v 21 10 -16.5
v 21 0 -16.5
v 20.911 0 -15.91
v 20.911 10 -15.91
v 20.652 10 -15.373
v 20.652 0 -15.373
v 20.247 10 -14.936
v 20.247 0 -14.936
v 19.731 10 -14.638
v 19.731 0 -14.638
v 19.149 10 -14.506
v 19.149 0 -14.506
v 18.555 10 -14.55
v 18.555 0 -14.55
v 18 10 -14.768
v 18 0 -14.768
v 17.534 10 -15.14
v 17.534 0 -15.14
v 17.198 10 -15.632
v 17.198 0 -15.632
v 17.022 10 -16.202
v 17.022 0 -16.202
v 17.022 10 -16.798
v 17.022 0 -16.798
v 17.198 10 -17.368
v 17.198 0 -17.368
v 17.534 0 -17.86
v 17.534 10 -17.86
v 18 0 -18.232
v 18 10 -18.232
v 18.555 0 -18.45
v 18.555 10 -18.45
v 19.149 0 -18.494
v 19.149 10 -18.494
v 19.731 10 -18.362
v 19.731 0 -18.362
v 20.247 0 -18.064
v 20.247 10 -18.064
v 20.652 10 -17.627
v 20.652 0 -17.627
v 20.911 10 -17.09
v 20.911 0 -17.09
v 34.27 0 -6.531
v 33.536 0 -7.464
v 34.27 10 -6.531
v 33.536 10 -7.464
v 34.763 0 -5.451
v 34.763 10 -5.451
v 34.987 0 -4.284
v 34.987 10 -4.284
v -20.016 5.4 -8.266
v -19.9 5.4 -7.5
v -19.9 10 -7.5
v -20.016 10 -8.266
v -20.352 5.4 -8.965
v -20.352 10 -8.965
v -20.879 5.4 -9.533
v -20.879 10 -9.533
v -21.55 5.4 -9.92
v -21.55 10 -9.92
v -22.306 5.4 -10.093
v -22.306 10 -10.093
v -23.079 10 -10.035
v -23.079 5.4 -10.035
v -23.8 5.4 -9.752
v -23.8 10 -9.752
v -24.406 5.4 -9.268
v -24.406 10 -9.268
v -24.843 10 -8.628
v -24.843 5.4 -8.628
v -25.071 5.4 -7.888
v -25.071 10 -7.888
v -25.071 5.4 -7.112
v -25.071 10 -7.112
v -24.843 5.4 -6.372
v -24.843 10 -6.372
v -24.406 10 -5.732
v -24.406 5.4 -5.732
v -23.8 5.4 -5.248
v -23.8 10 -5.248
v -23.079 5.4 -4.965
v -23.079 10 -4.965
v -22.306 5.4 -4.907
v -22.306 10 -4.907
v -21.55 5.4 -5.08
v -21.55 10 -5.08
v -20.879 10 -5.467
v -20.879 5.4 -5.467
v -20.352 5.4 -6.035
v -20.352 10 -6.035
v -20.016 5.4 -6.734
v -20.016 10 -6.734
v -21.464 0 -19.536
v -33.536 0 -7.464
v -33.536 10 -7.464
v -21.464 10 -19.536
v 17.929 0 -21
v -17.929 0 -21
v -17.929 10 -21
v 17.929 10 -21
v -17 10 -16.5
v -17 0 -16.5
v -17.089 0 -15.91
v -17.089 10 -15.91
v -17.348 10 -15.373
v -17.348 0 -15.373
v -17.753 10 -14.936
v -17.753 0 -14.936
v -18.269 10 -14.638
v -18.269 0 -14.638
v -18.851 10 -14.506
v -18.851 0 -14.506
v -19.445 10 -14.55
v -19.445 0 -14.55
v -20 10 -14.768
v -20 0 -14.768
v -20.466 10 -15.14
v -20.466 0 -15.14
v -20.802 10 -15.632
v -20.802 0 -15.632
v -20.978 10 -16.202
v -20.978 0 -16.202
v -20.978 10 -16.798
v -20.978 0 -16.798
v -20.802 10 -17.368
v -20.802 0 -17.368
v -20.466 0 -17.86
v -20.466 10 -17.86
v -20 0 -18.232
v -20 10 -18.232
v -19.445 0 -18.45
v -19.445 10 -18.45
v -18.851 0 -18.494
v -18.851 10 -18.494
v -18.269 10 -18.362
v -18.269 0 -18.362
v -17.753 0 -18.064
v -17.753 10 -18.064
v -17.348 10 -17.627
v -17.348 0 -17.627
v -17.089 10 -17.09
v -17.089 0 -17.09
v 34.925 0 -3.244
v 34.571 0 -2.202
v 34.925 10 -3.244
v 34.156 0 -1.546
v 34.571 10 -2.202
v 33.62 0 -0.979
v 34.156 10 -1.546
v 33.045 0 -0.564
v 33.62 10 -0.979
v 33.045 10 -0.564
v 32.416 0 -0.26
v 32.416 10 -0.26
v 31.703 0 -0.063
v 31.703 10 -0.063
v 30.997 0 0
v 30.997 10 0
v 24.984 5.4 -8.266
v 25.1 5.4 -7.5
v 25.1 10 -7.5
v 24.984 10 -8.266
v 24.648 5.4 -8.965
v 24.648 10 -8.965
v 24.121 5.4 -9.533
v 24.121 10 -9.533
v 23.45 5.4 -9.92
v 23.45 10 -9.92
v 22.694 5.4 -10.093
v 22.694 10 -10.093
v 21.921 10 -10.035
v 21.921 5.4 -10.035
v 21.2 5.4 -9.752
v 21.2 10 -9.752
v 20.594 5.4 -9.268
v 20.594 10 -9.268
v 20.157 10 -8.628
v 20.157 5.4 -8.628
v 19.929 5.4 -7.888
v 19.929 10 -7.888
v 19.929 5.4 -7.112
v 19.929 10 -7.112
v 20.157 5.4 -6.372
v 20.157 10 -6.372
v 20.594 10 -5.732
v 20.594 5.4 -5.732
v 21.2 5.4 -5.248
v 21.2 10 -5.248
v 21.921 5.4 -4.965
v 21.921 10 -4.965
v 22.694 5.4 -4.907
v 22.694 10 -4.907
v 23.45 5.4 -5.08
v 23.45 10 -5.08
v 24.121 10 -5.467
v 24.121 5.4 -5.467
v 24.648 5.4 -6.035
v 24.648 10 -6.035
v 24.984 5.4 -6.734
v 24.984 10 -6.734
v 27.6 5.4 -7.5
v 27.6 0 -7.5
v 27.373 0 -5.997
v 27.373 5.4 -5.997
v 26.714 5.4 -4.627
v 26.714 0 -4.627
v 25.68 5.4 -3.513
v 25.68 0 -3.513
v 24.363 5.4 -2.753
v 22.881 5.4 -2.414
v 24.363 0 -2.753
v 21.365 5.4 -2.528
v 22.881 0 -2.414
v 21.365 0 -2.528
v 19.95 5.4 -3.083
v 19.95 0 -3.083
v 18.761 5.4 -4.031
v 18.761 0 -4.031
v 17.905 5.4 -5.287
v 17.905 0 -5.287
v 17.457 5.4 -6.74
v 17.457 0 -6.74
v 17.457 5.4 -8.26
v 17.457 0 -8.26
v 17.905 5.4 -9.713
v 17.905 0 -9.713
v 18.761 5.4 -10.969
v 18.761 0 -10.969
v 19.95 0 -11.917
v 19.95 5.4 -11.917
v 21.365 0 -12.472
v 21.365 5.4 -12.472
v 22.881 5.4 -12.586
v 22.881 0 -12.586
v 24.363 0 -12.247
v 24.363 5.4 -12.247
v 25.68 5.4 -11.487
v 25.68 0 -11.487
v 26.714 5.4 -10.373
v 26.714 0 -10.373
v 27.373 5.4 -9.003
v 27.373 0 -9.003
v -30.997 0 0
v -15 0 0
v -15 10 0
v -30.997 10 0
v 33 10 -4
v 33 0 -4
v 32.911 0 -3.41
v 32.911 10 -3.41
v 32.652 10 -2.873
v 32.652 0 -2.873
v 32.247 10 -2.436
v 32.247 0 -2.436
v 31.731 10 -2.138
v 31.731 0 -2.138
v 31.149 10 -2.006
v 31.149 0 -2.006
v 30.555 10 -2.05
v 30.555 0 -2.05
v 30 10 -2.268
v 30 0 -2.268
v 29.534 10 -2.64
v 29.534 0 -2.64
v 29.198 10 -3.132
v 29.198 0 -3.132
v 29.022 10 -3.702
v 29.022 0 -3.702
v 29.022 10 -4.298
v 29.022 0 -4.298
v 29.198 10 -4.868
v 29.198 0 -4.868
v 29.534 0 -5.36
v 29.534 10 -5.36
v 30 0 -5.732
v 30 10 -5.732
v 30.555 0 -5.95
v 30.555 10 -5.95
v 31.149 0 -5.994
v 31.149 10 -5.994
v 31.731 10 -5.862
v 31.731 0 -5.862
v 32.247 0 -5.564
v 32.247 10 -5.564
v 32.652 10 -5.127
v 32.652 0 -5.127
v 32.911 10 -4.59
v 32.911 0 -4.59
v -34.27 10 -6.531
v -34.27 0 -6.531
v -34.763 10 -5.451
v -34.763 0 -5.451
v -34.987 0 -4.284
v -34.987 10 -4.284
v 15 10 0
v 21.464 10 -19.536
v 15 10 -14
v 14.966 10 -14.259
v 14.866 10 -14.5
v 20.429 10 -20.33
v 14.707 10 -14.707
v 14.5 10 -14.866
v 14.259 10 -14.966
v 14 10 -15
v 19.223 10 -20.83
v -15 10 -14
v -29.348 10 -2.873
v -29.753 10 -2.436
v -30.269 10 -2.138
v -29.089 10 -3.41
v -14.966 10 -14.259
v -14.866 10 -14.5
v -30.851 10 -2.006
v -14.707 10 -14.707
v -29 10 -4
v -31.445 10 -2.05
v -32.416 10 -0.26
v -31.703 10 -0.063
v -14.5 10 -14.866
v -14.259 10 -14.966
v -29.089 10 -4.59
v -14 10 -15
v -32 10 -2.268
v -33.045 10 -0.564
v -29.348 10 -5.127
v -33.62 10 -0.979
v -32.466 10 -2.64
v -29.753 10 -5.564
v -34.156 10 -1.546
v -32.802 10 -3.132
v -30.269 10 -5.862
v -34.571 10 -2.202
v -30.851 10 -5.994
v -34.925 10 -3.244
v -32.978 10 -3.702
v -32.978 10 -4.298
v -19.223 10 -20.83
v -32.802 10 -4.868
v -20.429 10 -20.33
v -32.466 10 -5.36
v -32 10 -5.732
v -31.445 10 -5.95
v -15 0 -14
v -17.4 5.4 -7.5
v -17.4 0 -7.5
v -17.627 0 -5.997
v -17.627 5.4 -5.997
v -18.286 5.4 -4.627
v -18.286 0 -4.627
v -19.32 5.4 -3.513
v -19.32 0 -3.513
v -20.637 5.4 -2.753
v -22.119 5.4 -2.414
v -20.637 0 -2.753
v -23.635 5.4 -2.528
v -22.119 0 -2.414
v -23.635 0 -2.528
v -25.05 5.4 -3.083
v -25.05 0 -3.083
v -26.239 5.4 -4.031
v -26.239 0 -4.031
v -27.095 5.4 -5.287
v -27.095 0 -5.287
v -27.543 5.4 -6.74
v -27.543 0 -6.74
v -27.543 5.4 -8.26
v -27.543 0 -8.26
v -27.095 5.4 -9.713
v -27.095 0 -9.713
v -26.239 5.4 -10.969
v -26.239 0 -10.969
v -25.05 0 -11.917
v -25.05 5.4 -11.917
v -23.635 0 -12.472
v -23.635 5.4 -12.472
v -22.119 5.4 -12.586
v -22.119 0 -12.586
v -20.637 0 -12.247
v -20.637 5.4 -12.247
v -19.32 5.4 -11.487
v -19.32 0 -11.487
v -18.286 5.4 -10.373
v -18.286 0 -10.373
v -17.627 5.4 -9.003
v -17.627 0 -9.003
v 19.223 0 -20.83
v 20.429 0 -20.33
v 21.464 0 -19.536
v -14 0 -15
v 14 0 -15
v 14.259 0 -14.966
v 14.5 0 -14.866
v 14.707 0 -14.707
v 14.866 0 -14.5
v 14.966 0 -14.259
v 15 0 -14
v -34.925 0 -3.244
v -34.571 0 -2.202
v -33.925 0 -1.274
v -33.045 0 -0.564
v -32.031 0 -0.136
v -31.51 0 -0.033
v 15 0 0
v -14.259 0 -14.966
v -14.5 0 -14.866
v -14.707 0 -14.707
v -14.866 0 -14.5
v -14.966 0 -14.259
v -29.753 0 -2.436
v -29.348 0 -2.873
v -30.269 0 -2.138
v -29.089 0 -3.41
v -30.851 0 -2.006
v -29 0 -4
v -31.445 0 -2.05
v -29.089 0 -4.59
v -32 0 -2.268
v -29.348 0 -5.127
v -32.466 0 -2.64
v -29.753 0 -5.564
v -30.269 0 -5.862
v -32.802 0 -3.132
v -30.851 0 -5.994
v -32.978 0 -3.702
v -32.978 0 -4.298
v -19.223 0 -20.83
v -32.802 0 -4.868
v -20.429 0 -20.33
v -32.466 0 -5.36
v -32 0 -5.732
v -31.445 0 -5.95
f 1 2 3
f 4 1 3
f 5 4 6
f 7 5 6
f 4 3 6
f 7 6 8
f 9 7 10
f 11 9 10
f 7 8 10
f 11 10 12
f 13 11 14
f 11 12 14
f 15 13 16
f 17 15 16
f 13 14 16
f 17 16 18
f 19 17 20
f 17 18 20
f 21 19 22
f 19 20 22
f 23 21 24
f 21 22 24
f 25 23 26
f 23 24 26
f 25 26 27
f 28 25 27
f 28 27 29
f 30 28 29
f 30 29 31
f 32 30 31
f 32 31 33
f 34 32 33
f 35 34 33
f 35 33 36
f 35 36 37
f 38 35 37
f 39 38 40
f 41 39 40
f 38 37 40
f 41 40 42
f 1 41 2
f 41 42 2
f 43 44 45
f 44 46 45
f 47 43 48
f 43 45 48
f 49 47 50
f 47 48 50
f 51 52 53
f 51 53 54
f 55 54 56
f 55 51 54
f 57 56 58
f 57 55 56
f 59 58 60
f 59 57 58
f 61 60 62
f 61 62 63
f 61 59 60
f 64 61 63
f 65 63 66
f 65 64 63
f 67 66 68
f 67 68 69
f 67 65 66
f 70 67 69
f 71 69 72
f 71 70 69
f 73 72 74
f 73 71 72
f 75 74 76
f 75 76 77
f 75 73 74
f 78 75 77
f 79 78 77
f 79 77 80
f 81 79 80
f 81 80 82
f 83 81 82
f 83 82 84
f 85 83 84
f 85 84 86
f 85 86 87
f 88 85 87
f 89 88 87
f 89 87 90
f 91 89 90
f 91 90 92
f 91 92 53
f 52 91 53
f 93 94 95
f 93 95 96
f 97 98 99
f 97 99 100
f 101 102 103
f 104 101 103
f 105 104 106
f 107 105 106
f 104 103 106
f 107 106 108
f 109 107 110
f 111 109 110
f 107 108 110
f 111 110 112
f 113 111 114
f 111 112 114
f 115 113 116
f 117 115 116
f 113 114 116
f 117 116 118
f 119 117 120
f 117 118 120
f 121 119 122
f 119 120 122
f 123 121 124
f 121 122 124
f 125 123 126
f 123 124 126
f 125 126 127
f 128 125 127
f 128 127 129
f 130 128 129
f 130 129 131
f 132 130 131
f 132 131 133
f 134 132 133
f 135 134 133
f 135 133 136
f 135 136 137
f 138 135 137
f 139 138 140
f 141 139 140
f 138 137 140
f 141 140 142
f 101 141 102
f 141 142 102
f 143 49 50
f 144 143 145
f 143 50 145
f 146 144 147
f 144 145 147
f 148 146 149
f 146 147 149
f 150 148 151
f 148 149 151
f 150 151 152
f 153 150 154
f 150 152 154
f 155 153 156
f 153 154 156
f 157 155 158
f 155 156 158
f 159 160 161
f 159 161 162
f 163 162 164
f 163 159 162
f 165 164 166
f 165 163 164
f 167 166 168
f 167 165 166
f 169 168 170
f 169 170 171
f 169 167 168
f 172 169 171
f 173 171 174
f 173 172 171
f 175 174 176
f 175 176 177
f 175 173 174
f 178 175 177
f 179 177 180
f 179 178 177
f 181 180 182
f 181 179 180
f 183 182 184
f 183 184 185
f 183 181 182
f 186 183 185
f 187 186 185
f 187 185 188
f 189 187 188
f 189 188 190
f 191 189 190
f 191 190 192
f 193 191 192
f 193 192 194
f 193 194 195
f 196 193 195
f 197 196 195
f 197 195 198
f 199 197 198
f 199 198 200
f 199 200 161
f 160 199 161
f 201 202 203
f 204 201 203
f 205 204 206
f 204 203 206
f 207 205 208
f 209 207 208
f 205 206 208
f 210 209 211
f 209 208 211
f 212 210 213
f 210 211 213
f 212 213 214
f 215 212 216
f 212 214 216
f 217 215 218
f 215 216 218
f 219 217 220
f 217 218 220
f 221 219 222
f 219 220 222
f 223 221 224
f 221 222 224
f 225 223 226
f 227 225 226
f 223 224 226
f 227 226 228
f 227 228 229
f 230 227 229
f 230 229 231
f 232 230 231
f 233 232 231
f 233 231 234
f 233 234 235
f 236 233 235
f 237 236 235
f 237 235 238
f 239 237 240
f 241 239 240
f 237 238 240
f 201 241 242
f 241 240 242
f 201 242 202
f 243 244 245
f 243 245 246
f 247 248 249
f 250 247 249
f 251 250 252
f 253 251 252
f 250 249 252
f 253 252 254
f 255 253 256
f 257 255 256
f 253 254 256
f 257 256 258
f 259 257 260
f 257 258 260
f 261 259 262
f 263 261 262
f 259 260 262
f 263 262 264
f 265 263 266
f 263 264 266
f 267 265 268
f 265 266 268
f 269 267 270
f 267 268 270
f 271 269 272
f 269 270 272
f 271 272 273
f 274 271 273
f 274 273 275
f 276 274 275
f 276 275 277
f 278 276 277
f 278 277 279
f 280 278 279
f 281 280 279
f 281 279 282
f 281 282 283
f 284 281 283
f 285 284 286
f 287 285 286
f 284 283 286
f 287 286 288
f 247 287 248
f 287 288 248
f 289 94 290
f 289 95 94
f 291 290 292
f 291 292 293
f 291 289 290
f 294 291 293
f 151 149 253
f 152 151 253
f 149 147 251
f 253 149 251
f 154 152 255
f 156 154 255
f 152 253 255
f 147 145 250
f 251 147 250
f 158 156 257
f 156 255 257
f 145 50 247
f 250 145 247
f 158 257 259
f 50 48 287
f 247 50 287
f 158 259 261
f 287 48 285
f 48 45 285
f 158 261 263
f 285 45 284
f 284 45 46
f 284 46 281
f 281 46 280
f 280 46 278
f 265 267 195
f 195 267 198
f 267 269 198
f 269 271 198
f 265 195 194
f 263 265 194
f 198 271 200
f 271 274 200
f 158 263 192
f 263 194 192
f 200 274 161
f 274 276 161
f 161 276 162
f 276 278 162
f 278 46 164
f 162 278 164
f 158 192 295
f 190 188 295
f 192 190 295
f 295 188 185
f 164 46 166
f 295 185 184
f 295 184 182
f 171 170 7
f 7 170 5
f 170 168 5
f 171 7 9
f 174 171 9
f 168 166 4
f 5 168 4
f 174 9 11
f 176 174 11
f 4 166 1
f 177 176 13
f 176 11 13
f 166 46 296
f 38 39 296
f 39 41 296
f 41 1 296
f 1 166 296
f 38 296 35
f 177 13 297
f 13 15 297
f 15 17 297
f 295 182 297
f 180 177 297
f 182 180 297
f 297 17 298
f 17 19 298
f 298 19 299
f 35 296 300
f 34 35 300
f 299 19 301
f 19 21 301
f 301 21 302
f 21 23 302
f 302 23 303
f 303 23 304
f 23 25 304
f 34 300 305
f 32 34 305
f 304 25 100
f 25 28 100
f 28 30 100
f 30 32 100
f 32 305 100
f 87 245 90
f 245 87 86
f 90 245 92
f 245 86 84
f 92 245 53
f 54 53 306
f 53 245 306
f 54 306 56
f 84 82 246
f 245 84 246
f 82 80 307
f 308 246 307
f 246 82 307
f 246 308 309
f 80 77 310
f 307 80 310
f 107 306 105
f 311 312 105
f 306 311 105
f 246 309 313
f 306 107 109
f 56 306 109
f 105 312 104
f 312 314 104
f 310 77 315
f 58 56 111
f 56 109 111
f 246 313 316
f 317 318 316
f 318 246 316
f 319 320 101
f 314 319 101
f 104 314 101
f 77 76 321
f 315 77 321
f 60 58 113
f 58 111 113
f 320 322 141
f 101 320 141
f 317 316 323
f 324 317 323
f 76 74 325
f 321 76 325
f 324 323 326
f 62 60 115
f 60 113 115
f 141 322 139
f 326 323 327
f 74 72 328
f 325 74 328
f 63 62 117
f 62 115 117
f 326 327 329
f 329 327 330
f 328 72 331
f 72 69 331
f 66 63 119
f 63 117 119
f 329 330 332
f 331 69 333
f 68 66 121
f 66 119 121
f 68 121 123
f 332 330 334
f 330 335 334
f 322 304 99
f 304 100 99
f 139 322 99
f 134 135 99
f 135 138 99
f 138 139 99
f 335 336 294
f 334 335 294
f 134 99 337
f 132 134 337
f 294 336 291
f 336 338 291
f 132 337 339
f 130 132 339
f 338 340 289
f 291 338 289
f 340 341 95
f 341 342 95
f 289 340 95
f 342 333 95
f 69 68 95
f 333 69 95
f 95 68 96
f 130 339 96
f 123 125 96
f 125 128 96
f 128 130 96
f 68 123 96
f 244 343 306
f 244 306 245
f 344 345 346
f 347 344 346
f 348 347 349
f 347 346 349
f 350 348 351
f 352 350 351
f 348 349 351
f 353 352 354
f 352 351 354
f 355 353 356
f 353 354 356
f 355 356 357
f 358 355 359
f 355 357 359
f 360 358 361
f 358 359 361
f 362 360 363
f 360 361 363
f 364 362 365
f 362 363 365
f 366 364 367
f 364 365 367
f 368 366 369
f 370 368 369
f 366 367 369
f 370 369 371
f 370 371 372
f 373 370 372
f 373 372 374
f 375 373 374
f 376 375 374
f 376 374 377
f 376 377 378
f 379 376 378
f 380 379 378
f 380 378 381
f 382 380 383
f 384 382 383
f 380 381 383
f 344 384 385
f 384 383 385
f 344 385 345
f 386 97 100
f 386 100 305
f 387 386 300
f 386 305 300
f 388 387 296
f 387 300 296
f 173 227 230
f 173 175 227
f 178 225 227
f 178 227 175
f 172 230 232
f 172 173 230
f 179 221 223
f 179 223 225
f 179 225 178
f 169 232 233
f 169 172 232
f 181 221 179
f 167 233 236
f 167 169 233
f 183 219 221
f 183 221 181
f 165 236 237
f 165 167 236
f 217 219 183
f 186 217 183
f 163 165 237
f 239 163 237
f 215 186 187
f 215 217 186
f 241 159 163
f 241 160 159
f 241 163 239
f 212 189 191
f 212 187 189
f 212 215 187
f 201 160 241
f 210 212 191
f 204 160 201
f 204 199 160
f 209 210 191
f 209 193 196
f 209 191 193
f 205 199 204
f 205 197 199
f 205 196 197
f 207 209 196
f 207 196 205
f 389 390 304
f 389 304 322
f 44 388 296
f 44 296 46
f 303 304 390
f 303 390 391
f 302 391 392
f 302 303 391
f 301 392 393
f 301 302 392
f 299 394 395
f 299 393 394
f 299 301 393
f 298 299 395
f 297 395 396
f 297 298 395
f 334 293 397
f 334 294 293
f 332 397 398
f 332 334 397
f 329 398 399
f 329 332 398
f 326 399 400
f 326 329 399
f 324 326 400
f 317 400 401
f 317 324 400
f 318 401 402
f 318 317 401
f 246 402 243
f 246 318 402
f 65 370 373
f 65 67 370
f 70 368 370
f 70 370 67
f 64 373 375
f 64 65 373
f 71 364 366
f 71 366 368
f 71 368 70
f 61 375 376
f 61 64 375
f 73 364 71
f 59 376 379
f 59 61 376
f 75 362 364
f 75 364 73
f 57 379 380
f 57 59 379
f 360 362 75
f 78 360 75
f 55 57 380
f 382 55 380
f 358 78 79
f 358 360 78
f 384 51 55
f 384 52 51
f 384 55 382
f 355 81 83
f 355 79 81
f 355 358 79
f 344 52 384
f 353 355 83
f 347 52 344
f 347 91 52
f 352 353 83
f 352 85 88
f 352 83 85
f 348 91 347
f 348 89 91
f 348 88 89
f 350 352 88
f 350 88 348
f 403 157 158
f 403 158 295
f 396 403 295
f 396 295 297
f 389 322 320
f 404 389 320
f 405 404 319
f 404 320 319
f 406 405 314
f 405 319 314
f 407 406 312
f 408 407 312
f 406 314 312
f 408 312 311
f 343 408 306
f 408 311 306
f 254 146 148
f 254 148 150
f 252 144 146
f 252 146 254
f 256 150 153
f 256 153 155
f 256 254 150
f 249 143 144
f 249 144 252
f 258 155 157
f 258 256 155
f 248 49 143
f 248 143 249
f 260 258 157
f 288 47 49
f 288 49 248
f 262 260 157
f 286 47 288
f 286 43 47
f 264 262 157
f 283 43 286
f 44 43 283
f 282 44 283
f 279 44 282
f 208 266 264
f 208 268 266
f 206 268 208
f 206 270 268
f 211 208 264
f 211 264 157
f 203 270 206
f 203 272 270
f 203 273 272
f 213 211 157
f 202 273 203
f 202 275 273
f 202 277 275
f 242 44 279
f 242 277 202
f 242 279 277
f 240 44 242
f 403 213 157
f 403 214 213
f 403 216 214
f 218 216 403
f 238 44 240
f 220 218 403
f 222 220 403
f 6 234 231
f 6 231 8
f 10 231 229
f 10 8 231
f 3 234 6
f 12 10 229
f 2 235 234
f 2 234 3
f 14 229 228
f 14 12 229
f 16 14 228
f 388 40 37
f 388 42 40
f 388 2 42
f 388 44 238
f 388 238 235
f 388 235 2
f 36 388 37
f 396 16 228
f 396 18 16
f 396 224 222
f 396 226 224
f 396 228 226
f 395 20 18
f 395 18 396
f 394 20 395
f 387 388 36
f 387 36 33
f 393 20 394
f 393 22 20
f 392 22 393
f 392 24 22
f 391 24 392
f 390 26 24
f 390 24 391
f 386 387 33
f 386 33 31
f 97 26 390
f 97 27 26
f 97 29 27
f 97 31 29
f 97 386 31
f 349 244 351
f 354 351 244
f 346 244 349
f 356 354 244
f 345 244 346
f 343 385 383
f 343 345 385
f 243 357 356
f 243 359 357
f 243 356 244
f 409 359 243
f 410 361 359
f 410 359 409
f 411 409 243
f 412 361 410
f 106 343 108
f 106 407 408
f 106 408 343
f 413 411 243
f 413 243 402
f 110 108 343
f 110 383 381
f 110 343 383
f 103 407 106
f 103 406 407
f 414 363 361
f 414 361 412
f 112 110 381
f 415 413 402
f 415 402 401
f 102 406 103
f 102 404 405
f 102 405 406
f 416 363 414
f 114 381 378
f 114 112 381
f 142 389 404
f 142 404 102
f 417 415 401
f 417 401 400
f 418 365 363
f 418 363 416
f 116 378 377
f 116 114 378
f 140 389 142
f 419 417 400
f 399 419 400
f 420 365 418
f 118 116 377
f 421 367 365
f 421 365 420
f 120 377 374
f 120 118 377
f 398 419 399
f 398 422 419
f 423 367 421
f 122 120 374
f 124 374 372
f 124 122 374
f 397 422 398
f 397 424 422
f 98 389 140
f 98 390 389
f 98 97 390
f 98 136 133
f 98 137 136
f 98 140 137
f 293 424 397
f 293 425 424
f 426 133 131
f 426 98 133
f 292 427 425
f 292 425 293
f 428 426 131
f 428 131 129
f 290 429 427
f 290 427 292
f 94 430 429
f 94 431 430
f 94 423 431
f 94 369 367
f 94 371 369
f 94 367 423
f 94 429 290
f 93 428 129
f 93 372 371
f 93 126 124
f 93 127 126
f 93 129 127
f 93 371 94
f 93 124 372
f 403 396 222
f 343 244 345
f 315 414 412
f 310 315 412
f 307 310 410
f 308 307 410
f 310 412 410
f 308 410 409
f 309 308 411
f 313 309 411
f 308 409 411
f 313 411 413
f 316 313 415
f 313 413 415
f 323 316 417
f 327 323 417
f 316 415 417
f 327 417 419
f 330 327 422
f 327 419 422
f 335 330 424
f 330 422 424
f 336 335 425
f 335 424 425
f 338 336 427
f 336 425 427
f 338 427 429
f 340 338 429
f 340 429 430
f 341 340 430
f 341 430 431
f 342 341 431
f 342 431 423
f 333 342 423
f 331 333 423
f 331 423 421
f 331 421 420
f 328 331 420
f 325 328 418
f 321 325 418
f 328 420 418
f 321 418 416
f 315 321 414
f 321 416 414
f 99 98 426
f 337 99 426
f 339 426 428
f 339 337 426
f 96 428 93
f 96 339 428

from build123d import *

# Parameters (mm, degrees)
ESQUISSE1_R             = 2.6
BOSS_EXTRU_1_DEPTH      = 10
ESQUISSE7_R             = 5.1
ENL_V_MAT_EXTRU_4_DEPTH = 5.4
ESQUISSE4_R             = 2
ENL_V_MAT_EXTRU_2_DEPTH = 10
ENL_V_MAT_EXTRU_3_DEPTH = 11
CONG_1_R                = 5
CONG_2_R                = 4


with BuildPart() as part:
    # Esquisse1 → Boss.-Extru.1 (new body)
    with BuildSketch(Plane(origin=(0, 0, 0), x_dir=(1, 0, 0), z_dir=(0, 1, 0))):
        Polygon((-20, 21), (20, 21), (35, 6), (35, 0), (15, 0), (15, 14), (14, 15), (-14, 15), (-15, 14), (-15, 0), (-35, 0), (-35, 6), align=None)
        with Locations((-22.5, 7.5)):
            Circle(ESQUISSE1_R, mode=Mode.SUBTRACT)
        with Locations((22.5, 7.5)):
            Circle(ESQUISSE1_R, mode=Mode.SUBTRACT)
    extrude(amount=BOSS_EXTRU_1_DEPTH)

    # Esquisse7 → Enlèv. mat.-Extru.4 (cut)
    with BuildSketch(Plane.XZ):
        with Locations((22.5, -7.5)):
            Circle(ESQUISSE7_R)
        with Locations((-22.5, -7.5)):
            Circle(ESQUISSE7_R)
    extrude(amount=-ENL_V_MAT_EXTRU_4_DEPTH, mode=Mode.SUBTRACT)

    # Esquisse4 → Enlèv. mat.-Extru.2 (cut)
    with BuildSketch(Plane.XZ):
        with Locations((19, -16.5)):
            Circle(ESQUISSE4_R)
        with Locations((-19, -16.5)):
            Circle(ESQUISSE4_R)
        with Locations((-31, -4)):
            Circle(ESQUISSE4_R)
        with Locations((31, -4)):
            Circle(ESQUISSE4_R)
    extrude(amount=-ENL_V_MAT_EXTRU_2_DEPTH, mode=Mode.SUBTRACT)

    # Esquisse5 → Enlèv. mat.-Extru.3 (cut, through all)
    with BuildSketch(Plane(origin=(0, 10, 0), x_dir=(1, 0, 0), z_dir=(0, 1, 0))):
        with BuildLine():
            Line((15, 14), (14, 14))
            Line((14, 14), (14, 15))
            ThreePointArc((14, 15), (14.707106781, 14.707106781), (15, 14))
        make_face()
        with BuildLine():
            Line((-14, 14), (-14, 15))
            ThreePointArc((-14, 15), (-14.707106781, 14.707106781), (-15, 14))
            Line((-15, 14), (-14, 14))
        make_face()
    extrude(amount=-ENL_V_MAT_EXTRU_3_DEPTH, mode=Mode.SUBTRACT)

    # Congé1
    cong_1_edges = [part.edges().sort_by_distance(p)[0] for p in [
        (-35, 5, -6),
        (-20, 5, -21),
        (20, 5, -21),
        (35, 5, -6),
    ]]
    fillet(cong_1_edges, radius=CONG_1_R)

    # Congé2
    cong_2_edges = [part.edges().sort_by_distance(p)[0] for p in [
        (35, 5, 0),
        (-35, 5, 0),
    ]]
    fillet(cong_2_edges, radius=CONG_2_R)


solid = part.part
